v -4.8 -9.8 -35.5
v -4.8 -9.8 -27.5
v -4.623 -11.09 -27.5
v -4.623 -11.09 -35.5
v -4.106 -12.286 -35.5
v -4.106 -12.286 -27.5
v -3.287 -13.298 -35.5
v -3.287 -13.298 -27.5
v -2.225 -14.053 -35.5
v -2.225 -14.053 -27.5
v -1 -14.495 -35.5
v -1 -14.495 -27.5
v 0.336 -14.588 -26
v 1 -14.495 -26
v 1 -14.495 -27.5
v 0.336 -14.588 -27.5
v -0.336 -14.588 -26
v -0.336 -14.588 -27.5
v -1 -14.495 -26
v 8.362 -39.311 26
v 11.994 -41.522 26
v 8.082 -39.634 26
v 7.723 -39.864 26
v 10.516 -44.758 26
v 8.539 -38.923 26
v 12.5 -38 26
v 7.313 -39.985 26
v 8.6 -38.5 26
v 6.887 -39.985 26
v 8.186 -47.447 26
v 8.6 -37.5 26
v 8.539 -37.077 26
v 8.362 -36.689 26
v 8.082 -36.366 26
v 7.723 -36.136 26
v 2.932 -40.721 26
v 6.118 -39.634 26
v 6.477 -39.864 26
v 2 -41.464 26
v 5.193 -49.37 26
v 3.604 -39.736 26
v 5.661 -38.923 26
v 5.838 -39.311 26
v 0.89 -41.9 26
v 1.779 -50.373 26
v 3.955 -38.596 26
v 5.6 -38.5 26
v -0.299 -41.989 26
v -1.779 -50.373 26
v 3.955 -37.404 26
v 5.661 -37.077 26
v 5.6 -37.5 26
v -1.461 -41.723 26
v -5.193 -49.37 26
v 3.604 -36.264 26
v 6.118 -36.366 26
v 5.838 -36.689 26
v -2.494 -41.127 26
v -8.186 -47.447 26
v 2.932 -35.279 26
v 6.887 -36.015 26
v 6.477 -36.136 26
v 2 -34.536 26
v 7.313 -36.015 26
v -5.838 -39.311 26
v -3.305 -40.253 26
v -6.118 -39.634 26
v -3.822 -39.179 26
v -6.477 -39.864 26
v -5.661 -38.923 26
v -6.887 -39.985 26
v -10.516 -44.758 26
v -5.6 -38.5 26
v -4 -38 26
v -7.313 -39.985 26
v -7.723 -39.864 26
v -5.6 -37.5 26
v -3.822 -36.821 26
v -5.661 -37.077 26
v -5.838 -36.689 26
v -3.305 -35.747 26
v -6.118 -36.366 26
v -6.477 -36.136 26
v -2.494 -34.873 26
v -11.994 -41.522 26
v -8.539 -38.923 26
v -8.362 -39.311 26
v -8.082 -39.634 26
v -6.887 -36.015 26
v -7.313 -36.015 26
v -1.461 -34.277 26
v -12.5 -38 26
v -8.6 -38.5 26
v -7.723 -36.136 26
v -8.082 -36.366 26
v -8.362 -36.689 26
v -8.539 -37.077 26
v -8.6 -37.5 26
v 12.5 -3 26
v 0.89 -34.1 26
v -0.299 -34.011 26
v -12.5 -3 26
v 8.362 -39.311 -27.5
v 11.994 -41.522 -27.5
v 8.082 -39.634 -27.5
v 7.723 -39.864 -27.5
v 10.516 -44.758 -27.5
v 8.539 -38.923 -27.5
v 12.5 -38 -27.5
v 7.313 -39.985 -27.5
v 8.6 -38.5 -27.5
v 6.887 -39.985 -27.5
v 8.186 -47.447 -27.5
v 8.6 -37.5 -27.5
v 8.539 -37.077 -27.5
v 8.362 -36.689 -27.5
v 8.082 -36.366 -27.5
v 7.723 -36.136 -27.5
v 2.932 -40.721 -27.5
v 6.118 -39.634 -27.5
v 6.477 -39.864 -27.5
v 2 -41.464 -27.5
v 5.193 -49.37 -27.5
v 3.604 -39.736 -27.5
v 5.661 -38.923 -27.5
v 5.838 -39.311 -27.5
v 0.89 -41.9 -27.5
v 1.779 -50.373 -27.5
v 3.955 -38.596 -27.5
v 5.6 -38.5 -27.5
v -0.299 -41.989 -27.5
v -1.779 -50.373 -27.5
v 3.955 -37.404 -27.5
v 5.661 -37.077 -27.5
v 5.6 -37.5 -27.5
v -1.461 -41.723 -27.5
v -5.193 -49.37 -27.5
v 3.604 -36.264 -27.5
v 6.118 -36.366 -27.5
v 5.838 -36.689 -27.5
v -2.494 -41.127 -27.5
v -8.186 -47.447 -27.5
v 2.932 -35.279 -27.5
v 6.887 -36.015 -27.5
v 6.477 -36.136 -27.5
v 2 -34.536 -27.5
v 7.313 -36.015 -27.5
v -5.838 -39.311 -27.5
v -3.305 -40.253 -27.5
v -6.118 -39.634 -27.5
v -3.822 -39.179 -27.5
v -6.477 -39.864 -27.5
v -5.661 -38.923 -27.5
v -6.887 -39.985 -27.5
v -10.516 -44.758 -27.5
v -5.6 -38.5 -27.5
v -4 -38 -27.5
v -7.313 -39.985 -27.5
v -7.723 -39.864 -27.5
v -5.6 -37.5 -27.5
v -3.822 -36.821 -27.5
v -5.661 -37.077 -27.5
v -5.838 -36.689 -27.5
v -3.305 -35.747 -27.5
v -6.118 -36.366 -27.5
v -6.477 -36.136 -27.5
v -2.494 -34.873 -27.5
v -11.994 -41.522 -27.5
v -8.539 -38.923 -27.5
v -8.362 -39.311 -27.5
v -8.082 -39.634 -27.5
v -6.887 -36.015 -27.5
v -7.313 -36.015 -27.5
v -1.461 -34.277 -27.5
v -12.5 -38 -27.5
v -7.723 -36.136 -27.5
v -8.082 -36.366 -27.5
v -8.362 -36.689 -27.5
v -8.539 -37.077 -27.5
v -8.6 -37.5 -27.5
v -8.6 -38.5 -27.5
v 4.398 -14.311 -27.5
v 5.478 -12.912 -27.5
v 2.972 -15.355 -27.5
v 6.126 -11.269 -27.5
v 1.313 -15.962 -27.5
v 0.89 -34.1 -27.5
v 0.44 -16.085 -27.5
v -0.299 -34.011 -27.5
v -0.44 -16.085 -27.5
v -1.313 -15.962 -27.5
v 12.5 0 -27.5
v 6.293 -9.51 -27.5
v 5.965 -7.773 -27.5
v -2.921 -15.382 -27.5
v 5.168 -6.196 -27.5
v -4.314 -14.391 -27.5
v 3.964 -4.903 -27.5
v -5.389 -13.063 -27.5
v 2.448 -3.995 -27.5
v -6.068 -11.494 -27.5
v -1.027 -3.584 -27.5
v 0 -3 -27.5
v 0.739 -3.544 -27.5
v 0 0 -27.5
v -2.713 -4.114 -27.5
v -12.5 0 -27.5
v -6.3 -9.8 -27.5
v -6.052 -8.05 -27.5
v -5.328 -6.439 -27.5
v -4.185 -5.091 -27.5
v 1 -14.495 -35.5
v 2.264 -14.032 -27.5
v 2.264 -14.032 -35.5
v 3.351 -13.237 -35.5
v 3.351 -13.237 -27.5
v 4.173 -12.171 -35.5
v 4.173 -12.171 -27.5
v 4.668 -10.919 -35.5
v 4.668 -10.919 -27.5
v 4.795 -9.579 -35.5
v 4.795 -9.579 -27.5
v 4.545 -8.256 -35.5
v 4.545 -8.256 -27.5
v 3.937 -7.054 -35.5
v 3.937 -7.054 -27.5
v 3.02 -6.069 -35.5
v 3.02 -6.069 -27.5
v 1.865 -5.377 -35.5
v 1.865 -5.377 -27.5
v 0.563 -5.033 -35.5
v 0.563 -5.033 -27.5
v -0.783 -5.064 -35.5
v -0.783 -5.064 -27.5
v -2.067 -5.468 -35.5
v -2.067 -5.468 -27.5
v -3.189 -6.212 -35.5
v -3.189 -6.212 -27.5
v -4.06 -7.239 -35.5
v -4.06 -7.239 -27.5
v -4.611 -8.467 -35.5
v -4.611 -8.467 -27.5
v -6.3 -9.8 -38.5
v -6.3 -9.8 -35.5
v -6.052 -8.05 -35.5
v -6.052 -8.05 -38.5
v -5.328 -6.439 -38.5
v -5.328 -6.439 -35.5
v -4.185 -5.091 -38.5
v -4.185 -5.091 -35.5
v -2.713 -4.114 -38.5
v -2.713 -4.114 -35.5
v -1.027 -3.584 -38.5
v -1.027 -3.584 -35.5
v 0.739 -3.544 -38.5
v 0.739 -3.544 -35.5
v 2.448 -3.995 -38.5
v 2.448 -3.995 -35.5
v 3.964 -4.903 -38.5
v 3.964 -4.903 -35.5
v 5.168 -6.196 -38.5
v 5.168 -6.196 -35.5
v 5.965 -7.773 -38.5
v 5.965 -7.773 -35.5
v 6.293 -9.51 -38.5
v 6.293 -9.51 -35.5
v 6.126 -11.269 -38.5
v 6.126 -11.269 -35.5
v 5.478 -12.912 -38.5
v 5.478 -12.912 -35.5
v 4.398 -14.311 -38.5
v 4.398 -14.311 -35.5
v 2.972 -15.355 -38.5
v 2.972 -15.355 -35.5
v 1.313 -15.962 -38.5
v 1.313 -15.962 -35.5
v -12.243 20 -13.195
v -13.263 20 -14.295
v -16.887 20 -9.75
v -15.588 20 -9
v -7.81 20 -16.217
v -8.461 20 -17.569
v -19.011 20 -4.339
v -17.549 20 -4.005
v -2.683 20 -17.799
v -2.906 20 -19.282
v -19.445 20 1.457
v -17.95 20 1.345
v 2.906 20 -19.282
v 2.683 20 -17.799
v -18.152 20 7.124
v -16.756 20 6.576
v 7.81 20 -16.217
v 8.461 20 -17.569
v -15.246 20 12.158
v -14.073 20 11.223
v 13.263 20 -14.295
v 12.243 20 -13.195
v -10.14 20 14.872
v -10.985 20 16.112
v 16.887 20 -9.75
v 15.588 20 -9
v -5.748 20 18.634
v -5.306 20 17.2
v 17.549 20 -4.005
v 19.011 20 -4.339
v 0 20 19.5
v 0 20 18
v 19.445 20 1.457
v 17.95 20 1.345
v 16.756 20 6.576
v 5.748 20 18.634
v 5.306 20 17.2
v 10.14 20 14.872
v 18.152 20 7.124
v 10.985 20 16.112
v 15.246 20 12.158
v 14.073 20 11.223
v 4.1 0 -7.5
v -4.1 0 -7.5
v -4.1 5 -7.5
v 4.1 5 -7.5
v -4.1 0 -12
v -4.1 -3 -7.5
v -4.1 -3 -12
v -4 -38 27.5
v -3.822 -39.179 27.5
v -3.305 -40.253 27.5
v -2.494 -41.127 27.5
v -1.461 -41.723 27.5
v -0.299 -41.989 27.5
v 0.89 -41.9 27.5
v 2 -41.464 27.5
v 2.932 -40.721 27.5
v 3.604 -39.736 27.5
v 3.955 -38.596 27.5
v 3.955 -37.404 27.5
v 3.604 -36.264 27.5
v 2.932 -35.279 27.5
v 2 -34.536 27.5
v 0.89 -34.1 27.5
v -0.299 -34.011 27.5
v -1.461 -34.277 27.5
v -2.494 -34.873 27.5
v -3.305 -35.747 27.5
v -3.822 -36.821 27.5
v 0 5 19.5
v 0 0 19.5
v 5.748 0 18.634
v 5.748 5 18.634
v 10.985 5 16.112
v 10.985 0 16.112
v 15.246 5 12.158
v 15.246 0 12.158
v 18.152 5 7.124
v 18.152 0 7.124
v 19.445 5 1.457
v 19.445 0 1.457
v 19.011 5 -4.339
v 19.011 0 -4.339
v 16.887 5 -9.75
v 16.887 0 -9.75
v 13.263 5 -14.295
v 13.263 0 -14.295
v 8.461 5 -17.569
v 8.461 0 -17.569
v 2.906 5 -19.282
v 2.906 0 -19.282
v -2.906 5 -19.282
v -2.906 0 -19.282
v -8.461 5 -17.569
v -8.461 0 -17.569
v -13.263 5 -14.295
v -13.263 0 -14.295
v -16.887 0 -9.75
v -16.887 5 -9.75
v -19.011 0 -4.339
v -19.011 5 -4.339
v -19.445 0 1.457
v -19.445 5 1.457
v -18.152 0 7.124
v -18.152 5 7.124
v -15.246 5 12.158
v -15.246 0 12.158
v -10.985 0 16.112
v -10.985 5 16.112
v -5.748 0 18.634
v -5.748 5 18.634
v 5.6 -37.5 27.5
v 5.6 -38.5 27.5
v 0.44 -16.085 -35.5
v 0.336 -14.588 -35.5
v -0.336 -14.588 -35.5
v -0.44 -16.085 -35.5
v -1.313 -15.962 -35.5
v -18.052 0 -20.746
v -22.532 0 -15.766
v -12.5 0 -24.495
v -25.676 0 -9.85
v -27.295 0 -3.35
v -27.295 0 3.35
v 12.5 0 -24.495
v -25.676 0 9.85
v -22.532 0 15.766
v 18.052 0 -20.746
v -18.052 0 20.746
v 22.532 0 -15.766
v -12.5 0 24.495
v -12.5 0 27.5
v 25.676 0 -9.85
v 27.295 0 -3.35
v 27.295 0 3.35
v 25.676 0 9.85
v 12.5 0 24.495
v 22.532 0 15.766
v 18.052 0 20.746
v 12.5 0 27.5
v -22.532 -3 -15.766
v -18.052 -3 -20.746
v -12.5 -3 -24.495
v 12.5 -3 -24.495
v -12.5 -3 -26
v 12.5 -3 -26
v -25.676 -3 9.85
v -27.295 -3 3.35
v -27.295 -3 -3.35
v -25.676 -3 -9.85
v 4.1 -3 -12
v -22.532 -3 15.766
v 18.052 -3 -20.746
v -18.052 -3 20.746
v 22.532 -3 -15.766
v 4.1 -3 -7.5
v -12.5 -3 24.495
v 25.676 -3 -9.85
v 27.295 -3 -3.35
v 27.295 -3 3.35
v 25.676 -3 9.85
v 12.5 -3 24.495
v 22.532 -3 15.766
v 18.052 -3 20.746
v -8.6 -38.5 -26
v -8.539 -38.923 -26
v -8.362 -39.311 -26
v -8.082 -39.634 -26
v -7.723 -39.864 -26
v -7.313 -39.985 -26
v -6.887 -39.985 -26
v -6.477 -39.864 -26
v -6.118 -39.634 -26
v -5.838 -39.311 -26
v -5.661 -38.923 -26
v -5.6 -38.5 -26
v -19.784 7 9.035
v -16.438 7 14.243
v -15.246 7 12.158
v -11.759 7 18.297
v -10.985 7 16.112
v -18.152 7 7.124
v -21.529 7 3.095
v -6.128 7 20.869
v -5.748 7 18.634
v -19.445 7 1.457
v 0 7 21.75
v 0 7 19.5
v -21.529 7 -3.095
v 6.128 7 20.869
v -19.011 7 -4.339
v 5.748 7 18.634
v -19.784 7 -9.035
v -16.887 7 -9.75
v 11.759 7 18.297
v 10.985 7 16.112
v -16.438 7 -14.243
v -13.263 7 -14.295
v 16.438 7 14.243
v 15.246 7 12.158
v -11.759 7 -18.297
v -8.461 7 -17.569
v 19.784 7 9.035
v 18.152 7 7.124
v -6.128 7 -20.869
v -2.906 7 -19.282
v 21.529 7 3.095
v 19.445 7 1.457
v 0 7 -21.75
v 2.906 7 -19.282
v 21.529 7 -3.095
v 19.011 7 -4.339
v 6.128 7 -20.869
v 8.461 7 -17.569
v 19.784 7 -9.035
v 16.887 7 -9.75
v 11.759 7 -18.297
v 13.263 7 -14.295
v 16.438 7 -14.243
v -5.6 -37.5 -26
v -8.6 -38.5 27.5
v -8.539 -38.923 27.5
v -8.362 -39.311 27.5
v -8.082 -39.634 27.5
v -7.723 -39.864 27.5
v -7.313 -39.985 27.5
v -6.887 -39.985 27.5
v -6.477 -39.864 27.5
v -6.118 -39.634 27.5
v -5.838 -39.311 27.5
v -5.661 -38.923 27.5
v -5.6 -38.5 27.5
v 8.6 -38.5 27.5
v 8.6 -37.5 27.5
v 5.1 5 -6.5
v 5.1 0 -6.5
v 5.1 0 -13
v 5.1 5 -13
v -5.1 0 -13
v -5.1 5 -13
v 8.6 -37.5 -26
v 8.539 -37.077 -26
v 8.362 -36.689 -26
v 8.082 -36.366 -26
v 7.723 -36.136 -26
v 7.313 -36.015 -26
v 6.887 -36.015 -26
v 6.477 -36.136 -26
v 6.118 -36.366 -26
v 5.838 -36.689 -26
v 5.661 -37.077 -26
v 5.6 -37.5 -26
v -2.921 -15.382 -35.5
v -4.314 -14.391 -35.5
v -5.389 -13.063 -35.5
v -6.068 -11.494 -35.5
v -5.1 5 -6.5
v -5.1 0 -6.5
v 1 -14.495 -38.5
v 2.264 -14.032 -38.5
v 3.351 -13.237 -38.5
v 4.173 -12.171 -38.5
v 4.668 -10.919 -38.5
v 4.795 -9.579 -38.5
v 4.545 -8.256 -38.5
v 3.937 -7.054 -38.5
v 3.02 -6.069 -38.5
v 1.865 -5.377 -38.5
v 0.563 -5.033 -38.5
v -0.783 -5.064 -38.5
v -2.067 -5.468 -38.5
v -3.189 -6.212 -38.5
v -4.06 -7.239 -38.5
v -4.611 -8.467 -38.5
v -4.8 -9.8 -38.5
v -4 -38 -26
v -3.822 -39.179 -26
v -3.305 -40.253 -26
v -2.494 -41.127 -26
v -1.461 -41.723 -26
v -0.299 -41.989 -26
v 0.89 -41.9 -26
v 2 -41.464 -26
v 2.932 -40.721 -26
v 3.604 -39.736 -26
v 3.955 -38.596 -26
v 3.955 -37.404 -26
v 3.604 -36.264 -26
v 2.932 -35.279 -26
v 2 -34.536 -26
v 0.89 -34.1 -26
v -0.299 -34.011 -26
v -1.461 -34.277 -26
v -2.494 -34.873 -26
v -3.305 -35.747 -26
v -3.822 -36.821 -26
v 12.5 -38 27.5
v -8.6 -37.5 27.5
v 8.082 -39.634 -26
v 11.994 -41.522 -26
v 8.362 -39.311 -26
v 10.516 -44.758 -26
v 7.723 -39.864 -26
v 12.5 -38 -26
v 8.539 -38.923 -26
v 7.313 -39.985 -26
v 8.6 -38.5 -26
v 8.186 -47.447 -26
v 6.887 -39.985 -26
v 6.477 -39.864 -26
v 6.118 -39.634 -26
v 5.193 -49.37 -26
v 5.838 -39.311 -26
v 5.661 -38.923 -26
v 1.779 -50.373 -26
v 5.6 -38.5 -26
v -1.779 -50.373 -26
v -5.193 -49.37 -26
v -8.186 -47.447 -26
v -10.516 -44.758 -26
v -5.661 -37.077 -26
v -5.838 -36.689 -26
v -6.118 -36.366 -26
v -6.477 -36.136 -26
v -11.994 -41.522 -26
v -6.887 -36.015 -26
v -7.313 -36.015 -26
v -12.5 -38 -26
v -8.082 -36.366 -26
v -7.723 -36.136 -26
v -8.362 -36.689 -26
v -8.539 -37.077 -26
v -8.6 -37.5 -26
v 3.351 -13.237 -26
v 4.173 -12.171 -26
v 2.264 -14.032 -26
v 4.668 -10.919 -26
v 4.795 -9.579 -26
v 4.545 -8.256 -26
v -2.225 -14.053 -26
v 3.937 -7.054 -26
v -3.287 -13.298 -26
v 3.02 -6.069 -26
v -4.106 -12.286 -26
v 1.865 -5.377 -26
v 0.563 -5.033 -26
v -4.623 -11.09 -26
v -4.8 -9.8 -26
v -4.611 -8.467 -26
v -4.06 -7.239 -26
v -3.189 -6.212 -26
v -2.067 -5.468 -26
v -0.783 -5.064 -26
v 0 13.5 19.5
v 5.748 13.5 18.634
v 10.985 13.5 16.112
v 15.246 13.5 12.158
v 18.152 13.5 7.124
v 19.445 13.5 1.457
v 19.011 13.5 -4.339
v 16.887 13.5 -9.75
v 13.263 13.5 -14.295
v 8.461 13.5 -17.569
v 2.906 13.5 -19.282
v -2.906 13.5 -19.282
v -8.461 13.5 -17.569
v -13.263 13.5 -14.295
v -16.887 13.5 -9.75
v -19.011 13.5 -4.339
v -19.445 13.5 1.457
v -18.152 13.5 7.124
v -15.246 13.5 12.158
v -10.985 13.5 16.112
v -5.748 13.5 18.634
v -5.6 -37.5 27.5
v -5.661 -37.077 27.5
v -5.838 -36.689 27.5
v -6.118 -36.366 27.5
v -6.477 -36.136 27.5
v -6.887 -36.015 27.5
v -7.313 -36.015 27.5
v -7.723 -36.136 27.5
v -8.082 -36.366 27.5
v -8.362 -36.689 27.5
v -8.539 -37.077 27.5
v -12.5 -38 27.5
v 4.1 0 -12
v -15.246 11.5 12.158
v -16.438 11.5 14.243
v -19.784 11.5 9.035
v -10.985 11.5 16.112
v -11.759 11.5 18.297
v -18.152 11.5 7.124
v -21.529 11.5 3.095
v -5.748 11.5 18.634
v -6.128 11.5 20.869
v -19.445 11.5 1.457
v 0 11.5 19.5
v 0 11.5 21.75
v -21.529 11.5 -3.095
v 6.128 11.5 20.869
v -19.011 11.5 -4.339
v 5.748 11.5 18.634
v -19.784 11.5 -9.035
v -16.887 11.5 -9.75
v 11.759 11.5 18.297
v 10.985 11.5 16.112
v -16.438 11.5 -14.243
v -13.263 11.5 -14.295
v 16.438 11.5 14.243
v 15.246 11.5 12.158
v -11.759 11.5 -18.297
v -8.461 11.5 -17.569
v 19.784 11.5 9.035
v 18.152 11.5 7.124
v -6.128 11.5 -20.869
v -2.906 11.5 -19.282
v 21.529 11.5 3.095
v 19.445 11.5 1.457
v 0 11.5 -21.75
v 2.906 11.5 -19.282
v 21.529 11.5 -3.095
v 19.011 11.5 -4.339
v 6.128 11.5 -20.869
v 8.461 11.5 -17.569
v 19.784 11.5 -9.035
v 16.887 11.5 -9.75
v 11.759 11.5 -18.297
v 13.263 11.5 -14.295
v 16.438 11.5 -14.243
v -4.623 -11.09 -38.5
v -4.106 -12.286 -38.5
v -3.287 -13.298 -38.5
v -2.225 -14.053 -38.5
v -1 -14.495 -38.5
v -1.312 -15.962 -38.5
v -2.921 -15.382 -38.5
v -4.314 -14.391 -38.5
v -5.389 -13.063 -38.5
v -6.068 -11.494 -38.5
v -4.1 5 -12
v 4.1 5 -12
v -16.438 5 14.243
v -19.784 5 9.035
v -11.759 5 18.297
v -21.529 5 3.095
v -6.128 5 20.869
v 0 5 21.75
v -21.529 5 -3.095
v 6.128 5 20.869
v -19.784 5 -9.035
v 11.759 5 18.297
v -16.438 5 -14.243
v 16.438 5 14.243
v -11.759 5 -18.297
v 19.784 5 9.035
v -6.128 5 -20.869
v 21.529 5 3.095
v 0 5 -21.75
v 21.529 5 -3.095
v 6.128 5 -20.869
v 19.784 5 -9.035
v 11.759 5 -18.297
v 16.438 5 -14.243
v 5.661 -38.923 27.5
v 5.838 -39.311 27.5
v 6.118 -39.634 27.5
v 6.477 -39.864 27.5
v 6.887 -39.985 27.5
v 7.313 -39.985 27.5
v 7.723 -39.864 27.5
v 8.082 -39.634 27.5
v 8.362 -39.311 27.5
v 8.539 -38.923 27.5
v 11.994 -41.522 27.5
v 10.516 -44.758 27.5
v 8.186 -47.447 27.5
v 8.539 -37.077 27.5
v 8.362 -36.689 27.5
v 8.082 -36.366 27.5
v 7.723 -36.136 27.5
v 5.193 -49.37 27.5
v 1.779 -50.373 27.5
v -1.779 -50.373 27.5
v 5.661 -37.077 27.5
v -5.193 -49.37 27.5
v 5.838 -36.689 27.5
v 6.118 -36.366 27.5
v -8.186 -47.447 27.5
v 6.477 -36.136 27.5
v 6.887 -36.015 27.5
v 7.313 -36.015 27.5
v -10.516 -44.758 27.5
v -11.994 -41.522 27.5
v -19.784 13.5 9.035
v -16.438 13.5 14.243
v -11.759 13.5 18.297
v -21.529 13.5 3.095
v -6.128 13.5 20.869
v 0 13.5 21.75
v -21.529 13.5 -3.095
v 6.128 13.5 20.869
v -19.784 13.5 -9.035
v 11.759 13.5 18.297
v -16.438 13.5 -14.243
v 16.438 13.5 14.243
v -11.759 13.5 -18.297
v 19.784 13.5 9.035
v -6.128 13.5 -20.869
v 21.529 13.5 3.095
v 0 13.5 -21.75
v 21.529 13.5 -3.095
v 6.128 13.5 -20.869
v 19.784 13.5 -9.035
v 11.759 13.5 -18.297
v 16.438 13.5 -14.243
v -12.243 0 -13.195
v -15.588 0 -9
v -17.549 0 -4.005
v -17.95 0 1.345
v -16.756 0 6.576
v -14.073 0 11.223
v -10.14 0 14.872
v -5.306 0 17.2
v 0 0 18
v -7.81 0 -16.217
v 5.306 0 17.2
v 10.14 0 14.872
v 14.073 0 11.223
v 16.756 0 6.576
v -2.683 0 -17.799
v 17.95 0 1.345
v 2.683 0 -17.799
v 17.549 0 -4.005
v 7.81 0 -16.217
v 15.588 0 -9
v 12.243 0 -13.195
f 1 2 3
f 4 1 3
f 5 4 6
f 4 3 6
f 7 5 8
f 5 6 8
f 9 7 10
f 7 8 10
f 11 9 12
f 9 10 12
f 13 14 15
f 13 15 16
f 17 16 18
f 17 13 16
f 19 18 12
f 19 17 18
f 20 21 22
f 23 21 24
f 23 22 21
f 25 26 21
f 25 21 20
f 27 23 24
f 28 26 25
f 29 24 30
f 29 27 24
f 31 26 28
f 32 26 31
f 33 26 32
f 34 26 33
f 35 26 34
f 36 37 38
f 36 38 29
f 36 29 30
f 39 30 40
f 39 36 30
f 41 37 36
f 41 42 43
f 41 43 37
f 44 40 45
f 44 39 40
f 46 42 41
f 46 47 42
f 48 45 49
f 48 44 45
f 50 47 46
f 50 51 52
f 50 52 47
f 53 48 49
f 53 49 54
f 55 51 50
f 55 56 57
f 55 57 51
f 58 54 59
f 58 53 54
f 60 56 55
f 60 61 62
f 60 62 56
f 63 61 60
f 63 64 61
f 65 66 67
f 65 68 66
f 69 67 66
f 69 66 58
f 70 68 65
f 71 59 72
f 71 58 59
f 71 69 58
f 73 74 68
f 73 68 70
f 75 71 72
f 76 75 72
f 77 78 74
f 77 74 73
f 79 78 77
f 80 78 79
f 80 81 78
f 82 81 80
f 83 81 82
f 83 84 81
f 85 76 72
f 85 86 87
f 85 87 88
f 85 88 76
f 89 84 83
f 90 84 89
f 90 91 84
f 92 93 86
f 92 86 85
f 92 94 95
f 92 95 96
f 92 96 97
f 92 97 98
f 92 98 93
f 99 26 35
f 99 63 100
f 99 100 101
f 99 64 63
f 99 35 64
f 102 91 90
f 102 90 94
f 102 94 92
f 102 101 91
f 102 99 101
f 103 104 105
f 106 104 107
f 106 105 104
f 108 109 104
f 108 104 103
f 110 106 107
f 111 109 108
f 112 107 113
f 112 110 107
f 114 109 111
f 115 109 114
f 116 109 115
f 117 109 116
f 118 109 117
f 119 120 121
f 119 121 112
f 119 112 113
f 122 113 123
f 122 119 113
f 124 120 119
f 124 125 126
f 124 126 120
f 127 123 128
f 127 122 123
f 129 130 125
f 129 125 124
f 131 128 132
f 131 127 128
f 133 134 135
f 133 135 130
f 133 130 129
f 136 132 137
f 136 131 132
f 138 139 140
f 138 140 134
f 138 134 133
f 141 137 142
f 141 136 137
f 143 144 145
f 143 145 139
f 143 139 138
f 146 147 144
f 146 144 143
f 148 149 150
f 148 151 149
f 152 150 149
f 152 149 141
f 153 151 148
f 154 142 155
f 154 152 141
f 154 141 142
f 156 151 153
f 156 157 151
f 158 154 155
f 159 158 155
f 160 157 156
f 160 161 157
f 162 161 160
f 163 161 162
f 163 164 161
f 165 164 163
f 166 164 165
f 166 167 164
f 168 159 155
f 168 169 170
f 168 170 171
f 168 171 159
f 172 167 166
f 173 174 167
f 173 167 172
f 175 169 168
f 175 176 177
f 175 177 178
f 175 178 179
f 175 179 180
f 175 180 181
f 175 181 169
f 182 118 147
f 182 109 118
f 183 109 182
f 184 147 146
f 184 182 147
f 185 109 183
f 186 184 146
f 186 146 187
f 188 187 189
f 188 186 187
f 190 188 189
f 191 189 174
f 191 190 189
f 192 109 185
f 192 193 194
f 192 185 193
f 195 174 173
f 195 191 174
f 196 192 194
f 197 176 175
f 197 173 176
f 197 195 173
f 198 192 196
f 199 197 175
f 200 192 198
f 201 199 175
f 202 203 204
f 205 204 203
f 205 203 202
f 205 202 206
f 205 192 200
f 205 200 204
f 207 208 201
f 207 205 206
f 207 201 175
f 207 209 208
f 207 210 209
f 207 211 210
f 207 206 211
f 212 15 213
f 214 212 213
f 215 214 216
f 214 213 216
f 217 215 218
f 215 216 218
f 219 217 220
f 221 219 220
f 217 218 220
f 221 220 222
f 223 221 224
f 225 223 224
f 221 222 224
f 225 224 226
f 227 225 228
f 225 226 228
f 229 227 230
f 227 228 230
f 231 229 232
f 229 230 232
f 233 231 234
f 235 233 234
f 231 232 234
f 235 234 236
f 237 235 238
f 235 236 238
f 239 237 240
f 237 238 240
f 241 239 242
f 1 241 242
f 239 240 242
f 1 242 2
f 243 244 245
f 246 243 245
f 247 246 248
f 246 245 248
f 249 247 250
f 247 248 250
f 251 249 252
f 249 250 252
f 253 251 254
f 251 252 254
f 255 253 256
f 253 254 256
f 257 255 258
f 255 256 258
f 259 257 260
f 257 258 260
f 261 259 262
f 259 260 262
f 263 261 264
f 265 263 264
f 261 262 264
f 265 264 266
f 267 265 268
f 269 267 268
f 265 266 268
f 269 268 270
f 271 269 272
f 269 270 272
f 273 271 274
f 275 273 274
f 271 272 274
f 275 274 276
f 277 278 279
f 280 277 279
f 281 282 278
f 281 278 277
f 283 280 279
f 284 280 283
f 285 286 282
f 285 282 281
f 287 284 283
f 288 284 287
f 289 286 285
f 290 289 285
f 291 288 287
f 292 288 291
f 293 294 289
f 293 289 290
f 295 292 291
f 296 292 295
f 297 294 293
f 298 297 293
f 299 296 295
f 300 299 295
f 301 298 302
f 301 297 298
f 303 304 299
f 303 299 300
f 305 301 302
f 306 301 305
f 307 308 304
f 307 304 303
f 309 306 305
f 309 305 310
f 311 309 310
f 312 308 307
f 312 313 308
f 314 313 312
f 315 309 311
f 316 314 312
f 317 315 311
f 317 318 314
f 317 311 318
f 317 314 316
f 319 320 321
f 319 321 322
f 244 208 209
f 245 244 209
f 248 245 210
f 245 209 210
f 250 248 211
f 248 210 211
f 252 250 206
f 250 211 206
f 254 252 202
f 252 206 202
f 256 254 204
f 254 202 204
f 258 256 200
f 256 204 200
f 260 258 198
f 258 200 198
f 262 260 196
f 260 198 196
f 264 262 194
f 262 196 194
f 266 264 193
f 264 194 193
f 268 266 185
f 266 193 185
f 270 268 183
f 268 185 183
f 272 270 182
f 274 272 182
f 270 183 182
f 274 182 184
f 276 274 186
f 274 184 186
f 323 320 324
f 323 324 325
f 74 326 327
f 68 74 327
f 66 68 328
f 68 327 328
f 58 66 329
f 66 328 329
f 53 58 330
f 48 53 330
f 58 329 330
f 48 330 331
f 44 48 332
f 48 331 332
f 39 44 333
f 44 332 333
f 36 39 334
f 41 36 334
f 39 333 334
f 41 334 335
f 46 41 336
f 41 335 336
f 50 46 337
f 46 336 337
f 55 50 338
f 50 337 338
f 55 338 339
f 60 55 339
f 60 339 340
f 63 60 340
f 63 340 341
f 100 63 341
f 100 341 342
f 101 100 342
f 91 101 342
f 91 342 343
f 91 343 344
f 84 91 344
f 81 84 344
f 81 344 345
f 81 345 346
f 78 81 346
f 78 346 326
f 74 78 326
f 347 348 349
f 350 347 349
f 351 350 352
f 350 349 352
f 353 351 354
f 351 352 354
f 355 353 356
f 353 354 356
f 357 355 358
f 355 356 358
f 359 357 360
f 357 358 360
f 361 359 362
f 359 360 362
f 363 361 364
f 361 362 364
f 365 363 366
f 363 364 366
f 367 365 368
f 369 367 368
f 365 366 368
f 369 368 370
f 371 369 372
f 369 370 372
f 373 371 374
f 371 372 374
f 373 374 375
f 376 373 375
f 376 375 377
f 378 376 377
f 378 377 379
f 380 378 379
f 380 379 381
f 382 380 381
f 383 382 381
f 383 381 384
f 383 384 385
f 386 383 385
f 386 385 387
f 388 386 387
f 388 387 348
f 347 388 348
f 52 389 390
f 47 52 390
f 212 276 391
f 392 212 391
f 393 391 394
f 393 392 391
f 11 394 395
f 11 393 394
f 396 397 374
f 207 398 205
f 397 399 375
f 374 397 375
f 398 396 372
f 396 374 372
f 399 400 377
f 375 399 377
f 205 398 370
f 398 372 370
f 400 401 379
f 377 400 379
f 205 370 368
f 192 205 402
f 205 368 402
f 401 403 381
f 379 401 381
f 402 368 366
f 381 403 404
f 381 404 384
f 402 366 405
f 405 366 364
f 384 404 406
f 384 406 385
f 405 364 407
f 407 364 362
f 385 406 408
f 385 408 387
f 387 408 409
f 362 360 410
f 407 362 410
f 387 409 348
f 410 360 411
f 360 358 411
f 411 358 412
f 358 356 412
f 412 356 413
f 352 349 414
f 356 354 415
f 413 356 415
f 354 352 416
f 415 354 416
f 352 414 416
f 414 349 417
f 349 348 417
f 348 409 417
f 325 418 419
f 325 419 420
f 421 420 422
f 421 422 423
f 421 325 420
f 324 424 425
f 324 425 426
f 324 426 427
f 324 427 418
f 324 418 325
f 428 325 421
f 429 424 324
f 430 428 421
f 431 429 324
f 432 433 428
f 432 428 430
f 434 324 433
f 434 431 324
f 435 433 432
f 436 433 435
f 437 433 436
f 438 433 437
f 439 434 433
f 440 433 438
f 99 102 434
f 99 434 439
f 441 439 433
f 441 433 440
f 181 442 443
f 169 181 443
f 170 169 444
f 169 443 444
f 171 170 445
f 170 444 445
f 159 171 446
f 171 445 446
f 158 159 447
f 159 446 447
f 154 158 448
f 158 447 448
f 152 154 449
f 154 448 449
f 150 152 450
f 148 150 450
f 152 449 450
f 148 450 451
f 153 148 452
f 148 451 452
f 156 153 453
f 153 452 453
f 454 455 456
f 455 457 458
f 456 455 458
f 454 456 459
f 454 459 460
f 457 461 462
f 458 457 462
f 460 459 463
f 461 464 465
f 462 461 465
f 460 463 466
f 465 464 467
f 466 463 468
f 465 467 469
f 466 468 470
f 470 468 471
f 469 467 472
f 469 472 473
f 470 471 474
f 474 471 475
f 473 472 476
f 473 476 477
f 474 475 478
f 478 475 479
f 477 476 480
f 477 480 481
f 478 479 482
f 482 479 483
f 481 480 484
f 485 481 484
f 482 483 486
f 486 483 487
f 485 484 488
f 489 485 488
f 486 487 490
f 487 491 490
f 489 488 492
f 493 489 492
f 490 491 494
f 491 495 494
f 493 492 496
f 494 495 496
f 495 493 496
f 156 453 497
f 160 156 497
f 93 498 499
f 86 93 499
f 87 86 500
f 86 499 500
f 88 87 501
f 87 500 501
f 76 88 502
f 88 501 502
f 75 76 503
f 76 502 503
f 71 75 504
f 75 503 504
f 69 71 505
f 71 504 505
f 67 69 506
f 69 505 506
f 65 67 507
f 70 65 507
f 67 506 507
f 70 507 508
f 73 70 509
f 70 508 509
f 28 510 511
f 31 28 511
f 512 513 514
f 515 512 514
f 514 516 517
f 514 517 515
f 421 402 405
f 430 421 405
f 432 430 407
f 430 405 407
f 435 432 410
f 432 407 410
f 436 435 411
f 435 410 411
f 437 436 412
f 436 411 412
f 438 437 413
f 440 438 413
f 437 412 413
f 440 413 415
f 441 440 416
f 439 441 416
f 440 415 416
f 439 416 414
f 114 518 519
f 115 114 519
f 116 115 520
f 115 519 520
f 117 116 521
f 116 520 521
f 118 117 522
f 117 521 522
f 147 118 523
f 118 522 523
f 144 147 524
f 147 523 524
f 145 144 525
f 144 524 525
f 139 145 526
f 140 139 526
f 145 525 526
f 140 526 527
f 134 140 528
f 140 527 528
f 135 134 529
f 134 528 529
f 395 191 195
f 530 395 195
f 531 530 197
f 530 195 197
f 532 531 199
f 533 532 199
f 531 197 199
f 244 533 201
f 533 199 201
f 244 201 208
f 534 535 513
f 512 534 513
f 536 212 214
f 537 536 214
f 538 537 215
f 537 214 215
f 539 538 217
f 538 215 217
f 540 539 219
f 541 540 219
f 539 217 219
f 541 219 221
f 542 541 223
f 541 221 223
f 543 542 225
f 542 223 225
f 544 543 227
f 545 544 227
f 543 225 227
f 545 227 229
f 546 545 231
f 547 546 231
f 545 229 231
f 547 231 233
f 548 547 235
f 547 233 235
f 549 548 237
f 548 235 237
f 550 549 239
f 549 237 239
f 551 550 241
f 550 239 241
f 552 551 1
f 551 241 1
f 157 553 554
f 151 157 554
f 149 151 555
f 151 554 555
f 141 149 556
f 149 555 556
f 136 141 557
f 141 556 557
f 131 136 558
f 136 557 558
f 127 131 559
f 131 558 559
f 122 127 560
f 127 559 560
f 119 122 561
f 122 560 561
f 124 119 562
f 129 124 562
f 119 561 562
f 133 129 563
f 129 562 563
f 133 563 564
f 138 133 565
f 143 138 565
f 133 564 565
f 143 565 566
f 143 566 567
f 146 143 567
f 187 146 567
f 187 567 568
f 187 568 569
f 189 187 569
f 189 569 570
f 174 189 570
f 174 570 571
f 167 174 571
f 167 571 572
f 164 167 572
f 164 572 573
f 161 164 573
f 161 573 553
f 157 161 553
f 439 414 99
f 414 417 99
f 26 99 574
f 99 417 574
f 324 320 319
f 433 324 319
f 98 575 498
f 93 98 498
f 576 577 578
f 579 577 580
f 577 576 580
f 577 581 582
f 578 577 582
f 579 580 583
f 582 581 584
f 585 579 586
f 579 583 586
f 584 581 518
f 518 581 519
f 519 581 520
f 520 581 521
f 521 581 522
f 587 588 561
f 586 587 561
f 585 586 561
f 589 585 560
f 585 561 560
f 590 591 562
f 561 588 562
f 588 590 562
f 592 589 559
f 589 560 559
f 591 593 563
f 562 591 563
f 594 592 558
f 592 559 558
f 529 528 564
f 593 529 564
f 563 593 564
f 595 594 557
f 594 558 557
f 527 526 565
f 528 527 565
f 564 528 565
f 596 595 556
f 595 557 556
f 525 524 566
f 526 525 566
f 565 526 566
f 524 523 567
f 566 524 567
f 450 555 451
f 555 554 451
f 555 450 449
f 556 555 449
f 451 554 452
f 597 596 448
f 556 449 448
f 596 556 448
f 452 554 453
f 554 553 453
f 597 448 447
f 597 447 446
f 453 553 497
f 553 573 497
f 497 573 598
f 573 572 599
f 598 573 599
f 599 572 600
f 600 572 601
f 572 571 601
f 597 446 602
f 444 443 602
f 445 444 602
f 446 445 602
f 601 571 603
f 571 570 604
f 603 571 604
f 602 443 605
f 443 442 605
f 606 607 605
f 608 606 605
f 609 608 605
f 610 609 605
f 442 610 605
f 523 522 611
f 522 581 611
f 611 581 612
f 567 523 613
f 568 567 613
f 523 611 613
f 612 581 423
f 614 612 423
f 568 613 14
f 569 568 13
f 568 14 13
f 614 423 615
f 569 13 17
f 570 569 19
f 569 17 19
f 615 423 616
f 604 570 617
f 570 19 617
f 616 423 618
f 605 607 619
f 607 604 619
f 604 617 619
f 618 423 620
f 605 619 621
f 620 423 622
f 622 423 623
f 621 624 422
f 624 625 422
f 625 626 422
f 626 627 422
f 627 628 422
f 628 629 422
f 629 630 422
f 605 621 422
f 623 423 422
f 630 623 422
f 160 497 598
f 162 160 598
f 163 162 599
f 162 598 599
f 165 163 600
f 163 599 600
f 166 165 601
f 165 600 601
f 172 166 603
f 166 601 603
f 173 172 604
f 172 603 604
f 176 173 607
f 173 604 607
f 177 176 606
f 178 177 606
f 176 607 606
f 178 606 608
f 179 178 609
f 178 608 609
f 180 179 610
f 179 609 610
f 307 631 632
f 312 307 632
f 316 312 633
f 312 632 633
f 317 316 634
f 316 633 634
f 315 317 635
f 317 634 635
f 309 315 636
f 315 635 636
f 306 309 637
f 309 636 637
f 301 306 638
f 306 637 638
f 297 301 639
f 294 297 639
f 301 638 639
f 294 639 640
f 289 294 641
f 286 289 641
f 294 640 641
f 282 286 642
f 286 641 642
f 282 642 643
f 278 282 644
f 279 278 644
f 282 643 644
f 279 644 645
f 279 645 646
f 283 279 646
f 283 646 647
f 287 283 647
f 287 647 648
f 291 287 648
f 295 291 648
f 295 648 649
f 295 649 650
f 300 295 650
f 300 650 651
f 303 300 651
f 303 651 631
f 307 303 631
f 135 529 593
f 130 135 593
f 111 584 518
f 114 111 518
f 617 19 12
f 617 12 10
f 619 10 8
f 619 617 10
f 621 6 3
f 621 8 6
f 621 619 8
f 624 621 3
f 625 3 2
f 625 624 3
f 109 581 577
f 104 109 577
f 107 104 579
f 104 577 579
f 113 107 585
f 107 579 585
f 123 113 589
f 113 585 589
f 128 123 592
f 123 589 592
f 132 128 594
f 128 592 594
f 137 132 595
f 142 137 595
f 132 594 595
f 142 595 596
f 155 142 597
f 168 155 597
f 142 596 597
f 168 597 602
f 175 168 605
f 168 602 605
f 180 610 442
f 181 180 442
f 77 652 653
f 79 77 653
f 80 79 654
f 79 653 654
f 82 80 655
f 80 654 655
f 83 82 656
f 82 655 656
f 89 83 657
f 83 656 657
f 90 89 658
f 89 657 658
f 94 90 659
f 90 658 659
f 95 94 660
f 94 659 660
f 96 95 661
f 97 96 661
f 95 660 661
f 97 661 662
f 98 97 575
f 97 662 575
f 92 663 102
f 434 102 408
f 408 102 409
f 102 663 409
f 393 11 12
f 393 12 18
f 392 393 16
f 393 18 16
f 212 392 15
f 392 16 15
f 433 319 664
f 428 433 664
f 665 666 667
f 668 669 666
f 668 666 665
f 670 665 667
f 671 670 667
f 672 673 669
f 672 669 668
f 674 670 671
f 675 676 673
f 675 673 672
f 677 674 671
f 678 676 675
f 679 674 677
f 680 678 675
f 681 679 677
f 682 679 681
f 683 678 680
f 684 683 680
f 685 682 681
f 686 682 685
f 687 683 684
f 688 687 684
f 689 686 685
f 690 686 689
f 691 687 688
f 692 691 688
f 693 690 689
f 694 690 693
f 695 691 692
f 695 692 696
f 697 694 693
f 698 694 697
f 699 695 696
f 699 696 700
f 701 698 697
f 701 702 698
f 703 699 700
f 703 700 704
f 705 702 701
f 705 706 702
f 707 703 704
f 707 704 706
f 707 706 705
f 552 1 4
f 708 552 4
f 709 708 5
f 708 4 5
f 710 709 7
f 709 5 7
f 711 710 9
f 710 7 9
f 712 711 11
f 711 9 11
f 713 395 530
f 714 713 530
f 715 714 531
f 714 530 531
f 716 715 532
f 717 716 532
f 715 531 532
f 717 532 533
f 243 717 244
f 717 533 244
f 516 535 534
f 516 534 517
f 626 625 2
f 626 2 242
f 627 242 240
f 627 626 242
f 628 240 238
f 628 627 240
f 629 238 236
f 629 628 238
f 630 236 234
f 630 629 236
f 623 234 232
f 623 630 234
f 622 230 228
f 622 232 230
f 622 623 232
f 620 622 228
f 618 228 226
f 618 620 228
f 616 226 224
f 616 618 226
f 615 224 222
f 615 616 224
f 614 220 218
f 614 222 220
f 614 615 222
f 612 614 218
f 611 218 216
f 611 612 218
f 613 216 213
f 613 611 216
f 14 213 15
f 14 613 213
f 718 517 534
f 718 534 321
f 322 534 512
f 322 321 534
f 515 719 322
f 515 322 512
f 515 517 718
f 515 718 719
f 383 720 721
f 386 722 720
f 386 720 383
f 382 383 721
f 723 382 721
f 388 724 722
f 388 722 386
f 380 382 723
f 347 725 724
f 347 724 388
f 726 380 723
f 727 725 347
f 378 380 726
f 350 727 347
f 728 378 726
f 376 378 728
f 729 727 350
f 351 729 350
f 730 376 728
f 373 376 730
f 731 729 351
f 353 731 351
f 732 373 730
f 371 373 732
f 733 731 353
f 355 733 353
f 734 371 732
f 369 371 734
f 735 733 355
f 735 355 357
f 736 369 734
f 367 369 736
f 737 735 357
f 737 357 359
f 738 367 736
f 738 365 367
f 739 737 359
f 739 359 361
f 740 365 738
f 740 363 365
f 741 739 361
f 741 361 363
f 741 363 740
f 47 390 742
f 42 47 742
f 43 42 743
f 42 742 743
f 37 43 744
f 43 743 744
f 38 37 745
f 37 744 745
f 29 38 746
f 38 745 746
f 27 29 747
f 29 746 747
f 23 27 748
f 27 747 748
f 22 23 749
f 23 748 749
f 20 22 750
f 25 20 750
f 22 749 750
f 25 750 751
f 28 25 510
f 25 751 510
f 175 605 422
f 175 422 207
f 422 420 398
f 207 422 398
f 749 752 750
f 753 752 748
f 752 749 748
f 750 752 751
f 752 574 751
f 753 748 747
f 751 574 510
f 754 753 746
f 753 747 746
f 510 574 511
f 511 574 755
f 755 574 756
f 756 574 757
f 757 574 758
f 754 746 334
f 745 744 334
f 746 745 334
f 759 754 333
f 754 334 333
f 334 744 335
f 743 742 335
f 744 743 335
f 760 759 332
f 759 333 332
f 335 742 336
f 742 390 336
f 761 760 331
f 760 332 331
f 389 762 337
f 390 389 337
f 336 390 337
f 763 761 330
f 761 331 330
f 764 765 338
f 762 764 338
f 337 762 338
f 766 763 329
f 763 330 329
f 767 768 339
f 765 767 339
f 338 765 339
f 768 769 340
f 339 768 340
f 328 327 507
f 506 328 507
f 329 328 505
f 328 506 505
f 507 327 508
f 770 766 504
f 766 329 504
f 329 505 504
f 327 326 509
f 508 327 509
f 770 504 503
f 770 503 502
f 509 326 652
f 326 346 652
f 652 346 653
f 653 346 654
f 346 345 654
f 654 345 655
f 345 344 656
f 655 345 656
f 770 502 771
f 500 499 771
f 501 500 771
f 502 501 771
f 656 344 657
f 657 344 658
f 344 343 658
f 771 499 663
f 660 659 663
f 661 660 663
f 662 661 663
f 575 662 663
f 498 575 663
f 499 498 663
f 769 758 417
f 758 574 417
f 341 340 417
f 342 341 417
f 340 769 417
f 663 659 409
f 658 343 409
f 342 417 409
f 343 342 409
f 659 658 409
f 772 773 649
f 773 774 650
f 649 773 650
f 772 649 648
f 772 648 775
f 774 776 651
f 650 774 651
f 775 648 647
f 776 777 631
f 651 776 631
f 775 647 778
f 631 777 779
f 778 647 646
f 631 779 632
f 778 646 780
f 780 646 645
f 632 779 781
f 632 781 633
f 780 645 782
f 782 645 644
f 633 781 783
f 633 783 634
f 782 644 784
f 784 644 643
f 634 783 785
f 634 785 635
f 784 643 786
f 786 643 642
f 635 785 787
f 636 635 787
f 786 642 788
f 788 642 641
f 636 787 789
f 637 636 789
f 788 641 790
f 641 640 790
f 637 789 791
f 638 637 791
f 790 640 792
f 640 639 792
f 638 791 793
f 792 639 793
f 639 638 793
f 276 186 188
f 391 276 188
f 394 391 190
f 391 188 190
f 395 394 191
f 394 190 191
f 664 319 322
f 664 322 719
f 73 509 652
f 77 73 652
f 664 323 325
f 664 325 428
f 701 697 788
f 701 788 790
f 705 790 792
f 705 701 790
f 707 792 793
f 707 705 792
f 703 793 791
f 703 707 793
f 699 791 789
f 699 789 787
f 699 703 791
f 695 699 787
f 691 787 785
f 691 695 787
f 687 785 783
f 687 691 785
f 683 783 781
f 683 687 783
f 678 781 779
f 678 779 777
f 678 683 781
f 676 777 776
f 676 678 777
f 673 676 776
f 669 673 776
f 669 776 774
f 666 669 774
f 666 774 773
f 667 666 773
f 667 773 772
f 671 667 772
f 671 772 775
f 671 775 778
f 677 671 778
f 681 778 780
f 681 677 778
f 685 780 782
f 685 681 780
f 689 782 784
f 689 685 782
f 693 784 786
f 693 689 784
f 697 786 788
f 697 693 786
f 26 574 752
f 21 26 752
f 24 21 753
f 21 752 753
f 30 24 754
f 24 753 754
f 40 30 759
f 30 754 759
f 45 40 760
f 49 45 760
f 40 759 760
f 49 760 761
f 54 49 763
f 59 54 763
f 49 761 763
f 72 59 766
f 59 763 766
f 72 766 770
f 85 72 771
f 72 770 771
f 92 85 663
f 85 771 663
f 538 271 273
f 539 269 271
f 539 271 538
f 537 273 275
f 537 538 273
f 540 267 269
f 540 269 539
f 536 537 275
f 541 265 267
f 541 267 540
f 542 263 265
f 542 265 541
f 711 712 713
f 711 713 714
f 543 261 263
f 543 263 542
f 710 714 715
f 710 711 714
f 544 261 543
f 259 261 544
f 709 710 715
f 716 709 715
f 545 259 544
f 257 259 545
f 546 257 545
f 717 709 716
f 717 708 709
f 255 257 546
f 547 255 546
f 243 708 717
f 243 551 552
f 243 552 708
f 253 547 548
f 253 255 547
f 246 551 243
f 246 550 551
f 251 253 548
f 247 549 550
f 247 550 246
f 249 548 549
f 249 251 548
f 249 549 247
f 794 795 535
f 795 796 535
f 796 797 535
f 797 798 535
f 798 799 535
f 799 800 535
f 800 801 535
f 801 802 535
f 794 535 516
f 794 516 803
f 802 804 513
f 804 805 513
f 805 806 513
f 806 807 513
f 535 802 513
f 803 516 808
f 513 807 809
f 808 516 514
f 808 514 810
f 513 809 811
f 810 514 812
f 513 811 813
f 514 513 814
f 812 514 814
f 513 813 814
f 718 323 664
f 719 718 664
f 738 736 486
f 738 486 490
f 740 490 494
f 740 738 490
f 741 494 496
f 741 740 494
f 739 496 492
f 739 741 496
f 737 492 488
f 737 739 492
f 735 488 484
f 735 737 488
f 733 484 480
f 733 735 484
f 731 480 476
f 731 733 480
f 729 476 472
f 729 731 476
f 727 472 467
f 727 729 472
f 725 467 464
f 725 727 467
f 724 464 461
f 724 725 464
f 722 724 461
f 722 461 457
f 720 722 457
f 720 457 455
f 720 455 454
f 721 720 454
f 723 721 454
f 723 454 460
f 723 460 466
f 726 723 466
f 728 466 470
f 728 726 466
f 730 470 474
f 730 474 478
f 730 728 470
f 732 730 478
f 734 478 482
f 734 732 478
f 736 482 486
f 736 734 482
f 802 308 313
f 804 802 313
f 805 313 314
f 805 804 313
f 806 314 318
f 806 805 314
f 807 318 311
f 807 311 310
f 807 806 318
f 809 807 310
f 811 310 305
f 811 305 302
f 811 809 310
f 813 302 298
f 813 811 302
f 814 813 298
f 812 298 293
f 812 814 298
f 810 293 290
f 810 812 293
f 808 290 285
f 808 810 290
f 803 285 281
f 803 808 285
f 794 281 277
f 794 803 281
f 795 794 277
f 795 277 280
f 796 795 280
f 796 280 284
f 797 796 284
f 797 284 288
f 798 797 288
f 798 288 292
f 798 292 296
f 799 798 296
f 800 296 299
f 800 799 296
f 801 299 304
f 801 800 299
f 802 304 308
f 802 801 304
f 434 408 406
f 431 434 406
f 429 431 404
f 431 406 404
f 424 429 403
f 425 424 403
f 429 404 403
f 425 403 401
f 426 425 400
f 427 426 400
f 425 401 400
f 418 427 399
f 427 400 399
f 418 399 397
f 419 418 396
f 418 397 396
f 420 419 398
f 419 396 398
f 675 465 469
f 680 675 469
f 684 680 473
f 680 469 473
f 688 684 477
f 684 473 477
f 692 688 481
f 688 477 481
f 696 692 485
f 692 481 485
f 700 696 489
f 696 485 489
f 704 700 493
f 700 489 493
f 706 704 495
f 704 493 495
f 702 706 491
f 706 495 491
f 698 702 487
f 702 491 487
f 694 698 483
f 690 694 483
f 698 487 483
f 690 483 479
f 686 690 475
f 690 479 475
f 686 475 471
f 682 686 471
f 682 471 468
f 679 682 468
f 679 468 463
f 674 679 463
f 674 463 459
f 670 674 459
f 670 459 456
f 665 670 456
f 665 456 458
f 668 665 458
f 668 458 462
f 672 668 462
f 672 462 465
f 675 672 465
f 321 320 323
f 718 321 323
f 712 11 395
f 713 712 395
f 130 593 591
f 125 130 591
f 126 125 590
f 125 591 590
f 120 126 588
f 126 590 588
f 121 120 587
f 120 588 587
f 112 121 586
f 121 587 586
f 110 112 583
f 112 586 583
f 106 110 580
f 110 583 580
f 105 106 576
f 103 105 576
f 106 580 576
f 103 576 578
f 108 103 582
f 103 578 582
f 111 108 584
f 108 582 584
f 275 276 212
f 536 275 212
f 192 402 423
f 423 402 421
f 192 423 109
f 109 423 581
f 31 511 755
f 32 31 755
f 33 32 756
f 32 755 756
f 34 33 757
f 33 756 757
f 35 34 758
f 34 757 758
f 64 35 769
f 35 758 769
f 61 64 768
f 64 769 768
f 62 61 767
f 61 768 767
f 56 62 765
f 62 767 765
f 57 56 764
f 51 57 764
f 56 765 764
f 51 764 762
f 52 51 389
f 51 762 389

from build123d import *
from build123d.topology import SkipClean

# Parameters (mm, degrees)
SKETCH_1_R           = 19.5
SKETCH_1_R_2         = 18
EXTRUDE_1_DEPTH      = 20
SKETCH_3_R           = 27.5
EXTRUDE_2_DEPTH      = 3
EXTRUDE_START        = 2
SKETCH_25_R          = 21.75
SKETCH_25_R_2        = 19.5
EXTRUDE_12_DEPTH     = 2
EXTRUDE_START_2      = -1
SKETCH_26_R          = 21.75
SKETCH_26_R_2        = 19.5
EXTRUDE_13_DEPTH     = 2
SKETCH_27_W          = 25
SKETCH_27_H          = 53.5
EXTRUDE_14_DEPTH     = 3
SKETCH_28_R          = 4
EXTRUDE_17_DEPTH     = 1.5
EXTRUDE_START_3      = -53.5
SKETCH_28_25_R       = 4
EXTRUDE_25_DEPTH     = 53.5
CUT_EXTRUDE_START    = -52
SKETCH_28_27_R       = 4
CUT_EXTRUDE_15_DEPTH = 52
EXTRUDE_24_DEPTH     = 11
CUT_EXTRUDE_START_2  = -1.5
CUT_EXTRUDE_10_DEPTH = 1.5
SKETCH_34_W          = 10.2
SKETCH_34_H          = 6.5
SKETCH_34_W_2        = 8.2
SKETCH_34_H_2        = 4.5
EXTRUDE_22_DEPTH     = 5
SKETCH_37_W          = 8.2
SKETCH_37_H          = 4.5
CUT_EXTRUDE_9_DEPTH  = 5
EXTRUDE_26_DEPTH     = 8


with BuildPart() as part:
    # 草圖1 → 填料-伸長1 (new body)
    with BuildSketch(Plane(origin=(0, 0, 0), x_dir=(1, 0, 0), z_dir=(0, 1, 0))):
        Circle(SKETCH_1_R)
        Circle(SKETCH_1_R_2, mode=Mode.SUBTRACT)
    extrude(amount=EXTRUDE_1_DEPTH)

    # 草圖3 → 填料-伸長2 (add)
    with BuildSketch(Plane.XZ):
        Circle(SKETCH_3_R)
    extrude(amount=EXTRUDE_2_DEPTH)

    # 草圖25 → 填料-伸長12 (add)
    with BuildSketch(Plane(origin=(0, 7, 0), x_dir=(-1, 0, 0), z_dir=(0, -1, 0)).offset(EXTRUDE_START)):
        Circle(SKETCH_25_R)
        Circle(SKETCH_25_R_2, mode=Mode.SUBTRACT)
    extrude(amount=-EXTRUDE_12_DEPTH)

    # 草圖26 → 填料-伸長13 (add)
    with BuildSketch(Plane(origin=(0, 10.5, 0), x_dir=(-1, 0, 0), z_dir=(0, -1, 0)).offset(EXTRUDE_START_2)):
        Circle(SKETCH_26_R)
        Circle(SKETCH_26_R_2, mode=Mode.SUBTRACT)
    extrude(amount=-EXTRUDE_13_DEPTH)

    # 草圖27 → 填料-伸長14 (add)
    with BuildSketch(Plane.XZ.offset(3)):
        with Locations((0, 0.75)):
            Rectangle(SKETCH_27_W, SKETCH_27_H)
    extrude(amount=-EXTRUDE_14_DEPTH)

    # 草圖28 → 填料-伸長17 (add)
    with BuildSketch(Plane(origin=(0, 0, -26), x_dir=(-1, 0, 0), z_dir=(0, 0, -1))):
        with BuildLine():
            Line((12.5, 0), (-12.5, 0))
            Line((-12.5, 0), (-12.5, -38))
            ThreePointArc((-12.5, -38), (0, -50.5), (12.5, -38))
            Line((12.5, -38), (12.5, 0))
        make_face()
        with BuildLine():
            Line((8.6, -37.5), (8.6, -38.5))
            ThreePointArc((8.6, -38.5), (7.1, -40), (5.6, -38.5))
            Line((5.6, -38.5), (5.6, -37.5))
            ThreePointArc((5.6, -37.5), (7.1, -36), (8.6, -37.5))
        make_face(mode=Mode.SUBTRACT)
        with Locations((0, -38)):
            Circle(SKETCH_28_R, mode=Mode.SUBTRACT)
        with BuildLine():
            Line((-5.6, -37.5), (-5.6, -38.5))
            ThreePointArc((-5.6, -38.5), (-7.1, -40), (-8.6, -38.5))
            Line((-8.6, -38.5), (-8.6, -37.5))
            ThreePointArc((-8.6, -37.5), (-7.1, -36), (-5.6, -37.5))
        make_face(mode=Mode.SUBTRACT)
    extrude(amount=EXTRUDE_17_DEPTH)

    # 草圖28<25> → 填料-伸長25 (add)
    with BuildSketch(Plane(origin=(0, 0, -26), x_dir=(-1, 0, 0), z_dir=(0, 0, -1)).offset(EXTRUDE_START_3)):
        with BuildLine():
            Line((12.5, -38), (12.5, -3))
            Line((12.5, -3), (-12.5, -3))
            Line((-12.5, -3), (-12.5, -38))
            ThreePointArc((-12.5, -38), (0, -50.5), (12.5, -38))
        make_face()
        with BuildLine():
            Line((8.6, -37.5), (8.6, -38.5))
            ThreePointArc((8.6, -38.5), (7.1, -40), (5.6, -38.5))
            Line((5.6, -38.5), (5.6, -37.5))
            ThreePointArc((5.6, -37.5), (7.1, -36), (8.6, -37.5))
        make_face(mode=Mode.SUBTRACT)
        with Locations((0, -38)):
            Circle(SKETCH_28_25_R, mode=Mode.SUBTRACT)
        with BuildLine():
            Line((-5.6, -37.5), (-5.6, -38.5))
            ThreePointArc((-5.6, -38.5), (-7.1, -40), (-8.6, -38.5))
            Line((-8.6, -38.5), (-8.6, -37.5))
            ThreePointArc((-8.6, -37.5), (-7.1, -36), (-5.6, -37.5))
        make_face(mode=Mode.SUBTRACT)
    extrude(amount=EXTRUDE_25_DEPTH)

    # 草圖28<27> → 除料-伸長15 (cut)
    with BuildSketch(Plane(origin=(0, 0, -26), x_dir=(-1, 0, 0), z_dir=(0, 0, -1)).offset(CUT_EXTRUDE_START)):
        with BuildLine():
            Line((12.5, -38), (12.5, -3))
            Line((12.5, -3), (-12.5, -3))
            Line((-12.5, -3), (-12.5, -38))
            ThreePointArc((-12.5, -38), (0, -50.5), (12.5, -38))
        make_face()
        with BuildLine():
            Line((8.6, -37.5), (8.6, -38.5))
            ThreePointArc((8.6, -38.5), (7.1, -40), (5.6, -38.5))
            Line((5.6, -38.5), (5.6, -37.5))
            ThreePointArc((5.6, -37.5), (7.1, -36), (8.6, -37.5))
        make_face(mode=Mode.SUBTRACT)
        with Locations((0, -38)):
            Circle(SKETCH_28_27_R, mode=Mode.SUBTRACT)
        with BuildLine():
            Line((-5.6, -37.5), (-5.6, -38.5))
            ThreePointArc((-5.6, -38.5), (-7.1, -40), (-8.6, -38.5))
            Line((-8.6, -38.5), (-8.6, -37.5))
            ThreePointArc((-8.6, -37.5), (-7.1, -36), (-5.6, -37.5))
        make_face(mode=Mode.SUBTRACT)
    extrude(amount=CUT_EXTRUDE_15_DEPTH, mode=Mode.SUBTRACT)

    # 草圖38<4> → 填料-伸長24 (add)
    with BuildSketch(Plane(origin=(0, 0, -27.5), x_dir=(-1, 0, 0), z_dir=(0, 0, -1))):
        with BuildLine():
            Line((-1.3125, -15.961764662), (-1, -14.494677838))
            ThreePointArc((-1, -14.494677838), (-3.019933774, -6.069048379), (4.8, -9.8))
            ThreePointArc((4.8, -9.8), (3.730951621, -12.819933774), (1, -14.494677838))
            Line((1, -14.494677838), (1.3125, -15.961764662))
            ThreePointArc((1.3125, -15.961764662), (4.896874003, -13.763663079), (6.3, -9.8))
            ThreePointArc((6.3, -9.8), (-3.963663079, -4.903125997), (-1.3125, -15.961764662))
        make_face()
    extrude(amount=EXTRUDE_24_DEPTH)

    # 草圖38 → 除料-伸長10 (cut)
    with SkipClean():  # the faces are left unmerged after this step: merging them gives an invalid solid
        with BuildSketch(Plane(origin=(0, 0, -27.5), x_dir=(-1, 0, 0), z_dir=(0, 0, -1)).offset(CUT_EXTRUDE_START_2)):
            with BuildLine():
                ThreePointArc((4.8, -9.8), (-3.019933774, -6.069048379), (-1, -14.494677838))
                ThreePointArc((-1, -14.494677838), (0, -14.6), (1, -14.494677838))
                ThreePointArc((1, -14.494677838), (3.730951621, -12.819933774), (4.8, -9.8))
            make_face()
        extrude(amount=CUT_EXTRUDE_10_DEPTH, mode=Mode.SUBTRACT)

    # 草圖34 → 填料-伸長22 (add)
    with SkipClean():  # the faces are left unmerged after this step: merging them gives an invalid solid
        with BuildSketch(Plane(origin=(0, 0, 0), x_dir=(1, 0, 0), z_dir=(0, 1, 0))):
            with Locations((0, 9.75)):
                Rectangle(SKETCH_34_W, SKETCH_34_H)
            with Locations((0, 9.75)):
                Rectangle(SKETCH_34_W_2, SKETCH_34_H_2, mode=Mode.SUBTRACT)
        extrude(amount=EXTRUDE_22_DEPTH)

    # 草圖37 → 除料-伸長9 (cut)
    with SkipClean():  # the faces are left unmerged after this step: merging them gives an invalid solid
        with BuildSketch(Plane(origin=(0, 0, 0), x_dir=(1, 0, 0), z_dir=(0, 1, 0))):
            with Locations((0, 9.75)):
                Rectangle(SKETCH_37_W, SKETCH_37_H)
        extrude(amount=-CUT_EXTRUDE_9_DEPTH, mode=Mode.SUBTRACT)

    # 草圖38<12> → 填料-伸長26 (add)
    with SkipClean():  # the faces are left unmerged after this step: merging them gives an invalid solid
        with BuildSketch(Plane(origin=(0, 0, -27.5), x_dir=(-1, 0, 0), z_dir=(0, 0, -1))):
            with BuildLine():
                ThreePointArc((1, -14.494677838), (0, -14.6), (-1, -14.494677838))
                Line((-1, -14.494677838), (-1.3125, -15.961764662))
                ThreePointArc((-1.3125, -15.961764662), (0, -16.1), (1.3125, -15.961764662))
                Line((1.3125, -15.961764662), (1, -14.494677838))
            make_face()
        extrude(amount=EXTRUDE_26_DEPTH)


solid = part.part
